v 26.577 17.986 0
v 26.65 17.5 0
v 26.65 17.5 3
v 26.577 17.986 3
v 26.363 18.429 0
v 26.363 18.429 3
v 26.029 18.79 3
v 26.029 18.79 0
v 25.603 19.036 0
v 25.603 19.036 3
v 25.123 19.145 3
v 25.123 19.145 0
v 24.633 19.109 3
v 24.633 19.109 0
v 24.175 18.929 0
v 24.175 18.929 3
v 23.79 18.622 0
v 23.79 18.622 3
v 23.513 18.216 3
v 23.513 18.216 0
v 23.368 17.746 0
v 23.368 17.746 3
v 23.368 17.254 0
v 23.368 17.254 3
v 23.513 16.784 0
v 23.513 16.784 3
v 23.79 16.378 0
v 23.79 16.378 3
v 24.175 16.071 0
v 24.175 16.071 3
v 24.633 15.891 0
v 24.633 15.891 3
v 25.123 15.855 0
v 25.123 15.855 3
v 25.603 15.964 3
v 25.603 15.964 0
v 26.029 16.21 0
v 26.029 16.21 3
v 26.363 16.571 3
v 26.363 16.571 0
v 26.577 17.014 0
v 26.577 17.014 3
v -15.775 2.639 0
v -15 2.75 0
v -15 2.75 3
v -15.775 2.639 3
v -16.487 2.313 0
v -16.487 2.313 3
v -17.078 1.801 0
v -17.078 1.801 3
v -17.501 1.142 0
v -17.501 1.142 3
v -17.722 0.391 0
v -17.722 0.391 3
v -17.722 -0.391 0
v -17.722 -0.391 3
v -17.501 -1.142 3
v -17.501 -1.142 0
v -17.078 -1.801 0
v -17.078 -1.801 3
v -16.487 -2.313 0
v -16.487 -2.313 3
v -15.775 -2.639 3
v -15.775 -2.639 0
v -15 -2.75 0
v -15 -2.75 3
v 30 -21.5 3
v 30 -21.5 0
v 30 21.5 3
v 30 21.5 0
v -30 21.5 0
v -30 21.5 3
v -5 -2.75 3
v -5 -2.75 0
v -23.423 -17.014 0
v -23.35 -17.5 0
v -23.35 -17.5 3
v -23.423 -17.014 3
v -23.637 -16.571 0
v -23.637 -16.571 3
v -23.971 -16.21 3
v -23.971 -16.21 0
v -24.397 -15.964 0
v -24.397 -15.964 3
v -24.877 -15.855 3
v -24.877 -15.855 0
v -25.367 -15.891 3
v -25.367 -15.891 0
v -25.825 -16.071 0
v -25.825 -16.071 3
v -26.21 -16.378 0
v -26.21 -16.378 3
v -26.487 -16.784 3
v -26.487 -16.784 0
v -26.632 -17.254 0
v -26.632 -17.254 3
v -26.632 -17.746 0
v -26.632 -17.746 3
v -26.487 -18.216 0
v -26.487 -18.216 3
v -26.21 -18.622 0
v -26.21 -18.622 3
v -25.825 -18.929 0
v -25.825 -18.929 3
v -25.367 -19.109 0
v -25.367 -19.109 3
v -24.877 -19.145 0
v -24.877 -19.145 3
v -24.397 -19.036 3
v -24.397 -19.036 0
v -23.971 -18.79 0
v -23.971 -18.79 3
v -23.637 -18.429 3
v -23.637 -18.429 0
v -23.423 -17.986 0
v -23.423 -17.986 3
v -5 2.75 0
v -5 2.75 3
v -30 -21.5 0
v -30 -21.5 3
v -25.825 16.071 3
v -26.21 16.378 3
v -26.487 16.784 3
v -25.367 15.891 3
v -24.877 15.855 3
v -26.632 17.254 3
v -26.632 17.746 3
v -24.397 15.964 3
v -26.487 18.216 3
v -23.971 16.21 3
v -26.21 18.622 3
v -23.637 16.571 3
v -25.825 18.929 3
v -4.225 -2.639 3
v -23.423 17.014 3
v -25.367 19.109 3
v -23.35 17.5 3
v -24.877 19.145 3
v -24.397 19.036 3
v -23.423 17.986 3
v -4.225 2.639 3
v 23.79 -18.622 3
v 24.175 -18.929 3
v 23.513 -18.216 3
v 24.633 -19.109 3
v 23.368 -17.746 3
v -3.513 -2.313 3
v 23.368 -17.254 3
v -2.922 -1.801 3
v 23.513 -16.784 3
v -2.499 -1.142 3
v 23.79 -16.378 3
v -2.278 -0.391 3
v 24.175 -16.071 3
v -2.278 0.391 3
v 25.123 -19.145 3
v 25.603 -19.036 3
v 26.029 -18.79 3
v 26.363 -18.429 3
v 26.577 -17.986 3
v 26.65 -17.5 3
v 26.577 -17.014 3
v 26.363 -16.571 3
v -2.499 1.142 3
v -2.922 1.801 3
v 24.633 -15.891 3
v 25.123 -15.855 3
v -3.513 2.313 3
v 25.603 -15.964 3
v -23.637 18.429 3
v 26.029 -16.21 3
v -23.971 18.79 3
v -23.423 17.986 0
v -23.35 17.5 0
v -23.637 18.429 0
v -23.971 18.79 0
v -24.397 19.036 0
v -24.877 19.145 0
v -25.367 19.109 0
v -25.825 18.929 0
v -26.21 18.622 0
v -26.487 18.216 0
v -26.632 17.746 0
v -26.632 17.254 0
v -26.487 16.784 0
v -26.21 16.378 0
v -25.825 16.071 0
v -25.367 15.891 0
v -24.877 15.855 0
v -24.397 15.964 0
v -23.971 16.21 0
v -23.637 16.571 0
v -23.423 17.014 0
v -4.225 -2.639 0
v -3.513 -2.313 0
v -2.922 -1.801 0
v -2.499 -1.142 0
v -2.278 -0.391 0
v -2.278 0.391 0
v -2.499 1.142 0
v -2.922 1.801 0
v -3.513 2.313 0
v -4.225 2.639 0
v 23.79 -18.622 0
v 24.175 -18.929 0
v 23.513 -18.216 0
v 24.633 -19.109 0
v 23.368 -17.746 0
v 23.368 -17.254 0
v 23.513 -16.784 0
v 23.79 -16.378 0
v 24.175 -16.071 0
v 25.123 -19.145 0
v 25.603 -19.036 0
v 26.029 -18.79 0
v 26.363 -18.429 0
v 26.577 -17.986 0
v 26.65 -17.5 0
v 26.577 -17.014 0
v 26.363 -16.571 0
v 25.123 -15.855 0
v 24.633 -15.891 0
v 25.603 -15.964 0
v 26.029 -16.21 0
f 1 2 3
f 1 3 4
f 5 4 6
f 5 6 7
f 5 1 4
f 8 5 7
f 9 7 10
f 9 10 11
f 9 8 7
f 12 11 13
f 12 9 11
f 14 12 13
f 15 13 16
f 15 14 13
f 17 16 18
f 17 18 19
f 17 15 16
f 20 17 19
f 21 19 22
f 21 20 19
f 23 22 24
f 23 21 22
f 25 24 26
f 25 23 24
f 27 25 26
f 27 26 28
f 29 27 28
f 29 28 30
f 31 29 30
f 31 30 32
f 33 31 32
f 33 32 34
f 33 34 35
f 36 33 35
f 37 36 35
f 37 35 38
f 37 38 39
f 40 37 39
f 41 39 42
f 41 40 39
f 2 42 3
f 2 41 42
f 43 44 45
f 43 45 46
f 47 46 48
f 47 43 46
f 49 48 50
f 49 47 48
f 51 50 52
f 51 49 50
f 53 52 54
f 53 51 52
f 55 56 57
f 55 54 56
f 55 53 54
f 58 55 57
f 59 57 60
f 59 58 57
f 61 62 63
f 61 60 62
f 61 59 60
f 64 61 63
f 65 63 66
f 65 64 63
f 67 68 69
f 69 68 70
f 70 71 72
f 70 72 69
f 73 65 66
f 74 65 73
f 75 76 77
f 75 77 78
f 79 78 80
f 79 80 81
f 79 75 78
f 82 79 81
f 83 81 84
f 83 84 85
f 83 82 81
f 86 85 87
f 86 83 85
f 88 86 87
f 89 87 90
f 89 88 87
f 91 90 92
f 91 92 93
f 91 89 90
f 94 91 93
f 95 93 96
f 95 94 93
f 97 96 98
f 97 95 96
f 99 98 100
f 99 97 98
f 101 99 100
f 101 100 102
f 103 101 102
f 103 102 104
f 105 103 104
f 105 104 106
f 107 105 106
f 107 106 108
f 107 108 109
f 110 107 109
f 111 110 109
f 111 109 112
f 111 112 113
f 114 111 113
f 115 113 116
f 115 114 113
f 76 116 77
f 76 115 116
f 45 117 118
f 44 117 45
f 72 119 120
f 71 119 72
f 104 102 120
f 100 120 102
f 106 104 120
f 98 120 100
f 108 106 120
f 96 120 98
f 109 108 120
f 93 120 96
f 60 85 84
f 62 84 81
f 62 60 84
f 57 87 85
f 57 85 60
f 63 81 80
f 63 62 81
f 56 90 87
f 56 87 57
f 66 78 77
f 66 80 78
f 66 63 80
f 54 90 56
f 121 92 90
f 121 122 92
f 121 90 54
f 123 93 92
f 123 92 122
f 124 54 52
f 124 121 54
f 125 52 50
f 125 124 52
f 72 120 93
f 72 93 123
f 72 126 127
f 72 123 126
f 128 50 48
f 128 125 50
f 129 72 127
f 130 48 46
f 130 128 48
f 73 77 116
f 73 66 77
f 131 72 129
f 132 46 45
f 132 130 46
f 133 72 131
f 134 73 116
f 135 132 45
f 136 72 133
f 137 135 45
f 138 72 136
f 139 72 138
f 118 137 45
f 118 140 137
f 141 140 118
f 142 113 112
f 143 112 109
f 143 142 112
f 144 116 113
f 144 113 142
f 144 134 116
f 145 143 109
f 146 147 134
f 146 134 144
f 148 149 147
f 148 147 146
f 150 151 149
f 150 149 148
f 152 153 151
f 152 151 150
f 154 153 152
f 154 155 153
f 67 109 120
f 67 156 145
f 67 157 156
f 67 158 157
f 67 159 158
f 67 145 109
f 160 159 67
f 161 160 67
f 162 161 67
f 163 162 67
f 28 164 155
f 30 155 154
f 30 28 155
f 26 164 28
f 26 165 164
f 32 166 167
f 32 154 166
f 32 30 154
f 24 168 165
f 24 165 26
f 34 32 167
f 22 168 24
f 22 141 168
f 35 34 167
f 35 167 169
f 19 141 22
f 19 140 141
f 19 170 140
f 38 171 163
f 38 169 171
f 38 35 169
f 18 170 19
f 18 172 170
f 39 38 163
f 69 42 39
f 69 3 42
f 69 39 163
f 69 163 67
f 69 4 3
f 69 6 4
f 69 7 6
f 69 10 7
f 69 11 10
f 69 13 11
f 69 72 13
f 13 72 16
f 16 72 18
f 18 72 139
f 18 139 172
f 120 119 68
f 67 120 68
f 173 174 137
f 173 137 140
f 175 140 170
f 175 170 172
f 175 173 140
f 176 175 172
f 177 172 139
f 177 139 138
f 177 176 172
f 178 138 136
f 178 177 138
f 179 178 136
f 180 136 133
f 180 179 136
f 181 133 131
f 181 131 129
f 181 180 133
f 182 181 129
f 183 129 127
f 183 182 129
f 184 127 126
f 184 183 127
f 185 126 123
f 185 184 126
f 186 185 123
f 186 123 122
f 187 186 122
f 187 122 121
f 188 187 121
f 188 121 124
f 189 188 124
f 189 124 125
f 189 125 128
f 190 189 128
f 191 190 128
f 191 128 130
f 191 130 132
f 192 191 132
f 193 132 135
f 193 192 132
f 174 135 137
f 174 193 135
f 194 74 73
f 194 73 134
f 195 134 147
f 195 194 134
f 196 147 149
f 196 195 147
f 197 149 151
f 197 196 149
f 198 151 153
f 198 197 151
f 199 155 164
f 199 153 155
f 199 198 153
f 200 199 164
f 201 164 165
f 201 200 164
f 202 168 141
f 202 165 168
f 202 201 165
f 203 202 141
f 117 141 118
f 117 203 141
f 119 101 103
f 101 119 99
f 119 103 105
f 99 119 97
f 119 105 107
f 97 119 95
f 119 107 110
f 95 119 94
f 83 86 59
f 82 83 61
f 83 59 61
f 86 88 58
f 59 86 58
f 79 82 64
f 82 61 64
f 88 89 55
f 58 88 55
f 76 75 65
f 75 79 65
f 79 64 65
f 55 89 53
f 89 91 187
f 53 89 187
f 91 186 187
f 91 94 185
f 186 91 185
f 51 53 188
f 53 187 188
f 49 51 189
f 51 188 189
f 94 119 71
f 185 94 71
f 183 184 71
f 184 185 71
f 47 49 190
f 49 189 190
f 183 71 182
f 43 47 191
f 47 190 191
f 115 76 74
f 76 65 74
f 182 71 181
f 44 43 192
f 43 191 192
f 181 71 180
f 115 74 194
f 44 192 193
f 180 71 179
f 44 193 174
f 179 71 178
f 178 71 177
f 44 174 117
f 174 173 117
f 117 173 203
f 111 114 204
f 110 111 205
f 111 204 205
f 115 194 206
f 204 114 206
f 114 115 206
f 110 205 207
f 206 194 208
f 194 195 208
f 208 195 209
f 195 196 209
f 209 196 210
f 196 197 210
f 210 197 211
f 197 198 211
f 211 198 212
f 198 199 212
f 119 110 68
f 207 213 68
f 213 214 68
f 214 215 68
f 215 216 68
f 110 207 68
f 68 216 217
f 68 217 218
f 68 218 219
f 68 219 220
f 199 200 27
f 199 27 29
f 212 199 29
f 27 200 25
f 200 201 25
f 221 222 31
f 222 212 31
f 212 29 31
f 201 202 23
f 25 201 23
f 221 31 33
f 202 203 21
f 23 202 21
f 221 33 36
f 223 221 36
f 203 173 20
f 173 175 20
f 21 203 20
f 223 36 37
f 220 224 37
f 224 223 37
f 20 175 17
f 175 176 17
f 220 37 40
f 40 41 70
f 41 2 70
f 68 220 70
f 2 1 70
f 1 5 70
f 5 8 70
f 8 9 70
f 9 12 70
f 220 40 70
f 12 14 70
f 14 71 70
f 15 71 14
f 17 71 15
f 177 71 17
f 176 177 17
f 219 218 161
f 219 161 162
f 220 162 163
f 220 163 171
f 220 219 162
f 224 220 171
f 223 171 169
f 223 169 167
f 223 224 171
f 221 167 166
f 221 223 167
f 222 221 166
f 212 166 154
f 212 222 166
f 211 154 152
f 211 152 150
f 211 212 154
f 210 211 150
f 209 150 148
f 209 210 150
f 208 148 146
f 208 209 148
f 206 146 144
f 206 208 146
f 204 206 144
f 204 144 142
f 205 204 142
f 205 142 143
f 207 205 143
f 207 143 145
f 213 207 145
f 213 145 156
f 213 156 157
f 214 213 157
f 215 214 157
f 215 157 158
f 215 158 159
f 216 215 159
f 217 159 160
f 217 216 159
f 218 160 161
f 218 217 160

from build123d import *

# Parameters (mm, degrees)
SKETCH1_W           = 60
SKETCH1_H           = 43
SKETCH1_R           = 1.65
BOSS_EXTRUDE1_DEPTH = 3
CUT_EXTRUDE1_DEPTH  = 38.030392923


with BuildPart() as part:
    # Sketch1 → Boss-Extrude1 (new body)
    with BuildSketch(Plane.XY):
        Rectangle(SKETCH1_W, SKETCH1_H)
        with Locations((-25, 17.5)):
            Circle(SKETCH1_R, mode=Mode.SUBTRACT)
        with Locations((25, 17.5)):
            Circle(SKETCH1_R, mode=Mode.SUBTRACT)
        with Locations((25, -17.5)):
            Circle(SKETCH1_R, mode=Mode.SUBTRACT)
        with Locations((-25, -17.5)):
            Circle(SKETCH1_R, mode=Mode.SUBTRACT)
    extrude(amount=BOSS_EXTRUDE1_DEPTH)

    # Sketch2 → Cut-Extrude1 (cut, through all)
    with BuildSketch(Plane(origin=(0, 0, 0), x_dir=(-1, 0, 0), z_dir=(0, 0, -1))):
        with BuildLine():
            Line((15, -2.75), (5, -2.75))
            ThreePointArc((5, -2.75), (2.25, 0), (5, 2.75))
            Line((5, 2.75), (15, 2.75))
            ThreePointArc((15, 2.75), (17.75, 0), (15, -2.75))
        make_face()
    extrude(amount=-CUT_EXTRUDE1_DEPTH, mode=Mode.SUBTRACT)


solid = part.part
